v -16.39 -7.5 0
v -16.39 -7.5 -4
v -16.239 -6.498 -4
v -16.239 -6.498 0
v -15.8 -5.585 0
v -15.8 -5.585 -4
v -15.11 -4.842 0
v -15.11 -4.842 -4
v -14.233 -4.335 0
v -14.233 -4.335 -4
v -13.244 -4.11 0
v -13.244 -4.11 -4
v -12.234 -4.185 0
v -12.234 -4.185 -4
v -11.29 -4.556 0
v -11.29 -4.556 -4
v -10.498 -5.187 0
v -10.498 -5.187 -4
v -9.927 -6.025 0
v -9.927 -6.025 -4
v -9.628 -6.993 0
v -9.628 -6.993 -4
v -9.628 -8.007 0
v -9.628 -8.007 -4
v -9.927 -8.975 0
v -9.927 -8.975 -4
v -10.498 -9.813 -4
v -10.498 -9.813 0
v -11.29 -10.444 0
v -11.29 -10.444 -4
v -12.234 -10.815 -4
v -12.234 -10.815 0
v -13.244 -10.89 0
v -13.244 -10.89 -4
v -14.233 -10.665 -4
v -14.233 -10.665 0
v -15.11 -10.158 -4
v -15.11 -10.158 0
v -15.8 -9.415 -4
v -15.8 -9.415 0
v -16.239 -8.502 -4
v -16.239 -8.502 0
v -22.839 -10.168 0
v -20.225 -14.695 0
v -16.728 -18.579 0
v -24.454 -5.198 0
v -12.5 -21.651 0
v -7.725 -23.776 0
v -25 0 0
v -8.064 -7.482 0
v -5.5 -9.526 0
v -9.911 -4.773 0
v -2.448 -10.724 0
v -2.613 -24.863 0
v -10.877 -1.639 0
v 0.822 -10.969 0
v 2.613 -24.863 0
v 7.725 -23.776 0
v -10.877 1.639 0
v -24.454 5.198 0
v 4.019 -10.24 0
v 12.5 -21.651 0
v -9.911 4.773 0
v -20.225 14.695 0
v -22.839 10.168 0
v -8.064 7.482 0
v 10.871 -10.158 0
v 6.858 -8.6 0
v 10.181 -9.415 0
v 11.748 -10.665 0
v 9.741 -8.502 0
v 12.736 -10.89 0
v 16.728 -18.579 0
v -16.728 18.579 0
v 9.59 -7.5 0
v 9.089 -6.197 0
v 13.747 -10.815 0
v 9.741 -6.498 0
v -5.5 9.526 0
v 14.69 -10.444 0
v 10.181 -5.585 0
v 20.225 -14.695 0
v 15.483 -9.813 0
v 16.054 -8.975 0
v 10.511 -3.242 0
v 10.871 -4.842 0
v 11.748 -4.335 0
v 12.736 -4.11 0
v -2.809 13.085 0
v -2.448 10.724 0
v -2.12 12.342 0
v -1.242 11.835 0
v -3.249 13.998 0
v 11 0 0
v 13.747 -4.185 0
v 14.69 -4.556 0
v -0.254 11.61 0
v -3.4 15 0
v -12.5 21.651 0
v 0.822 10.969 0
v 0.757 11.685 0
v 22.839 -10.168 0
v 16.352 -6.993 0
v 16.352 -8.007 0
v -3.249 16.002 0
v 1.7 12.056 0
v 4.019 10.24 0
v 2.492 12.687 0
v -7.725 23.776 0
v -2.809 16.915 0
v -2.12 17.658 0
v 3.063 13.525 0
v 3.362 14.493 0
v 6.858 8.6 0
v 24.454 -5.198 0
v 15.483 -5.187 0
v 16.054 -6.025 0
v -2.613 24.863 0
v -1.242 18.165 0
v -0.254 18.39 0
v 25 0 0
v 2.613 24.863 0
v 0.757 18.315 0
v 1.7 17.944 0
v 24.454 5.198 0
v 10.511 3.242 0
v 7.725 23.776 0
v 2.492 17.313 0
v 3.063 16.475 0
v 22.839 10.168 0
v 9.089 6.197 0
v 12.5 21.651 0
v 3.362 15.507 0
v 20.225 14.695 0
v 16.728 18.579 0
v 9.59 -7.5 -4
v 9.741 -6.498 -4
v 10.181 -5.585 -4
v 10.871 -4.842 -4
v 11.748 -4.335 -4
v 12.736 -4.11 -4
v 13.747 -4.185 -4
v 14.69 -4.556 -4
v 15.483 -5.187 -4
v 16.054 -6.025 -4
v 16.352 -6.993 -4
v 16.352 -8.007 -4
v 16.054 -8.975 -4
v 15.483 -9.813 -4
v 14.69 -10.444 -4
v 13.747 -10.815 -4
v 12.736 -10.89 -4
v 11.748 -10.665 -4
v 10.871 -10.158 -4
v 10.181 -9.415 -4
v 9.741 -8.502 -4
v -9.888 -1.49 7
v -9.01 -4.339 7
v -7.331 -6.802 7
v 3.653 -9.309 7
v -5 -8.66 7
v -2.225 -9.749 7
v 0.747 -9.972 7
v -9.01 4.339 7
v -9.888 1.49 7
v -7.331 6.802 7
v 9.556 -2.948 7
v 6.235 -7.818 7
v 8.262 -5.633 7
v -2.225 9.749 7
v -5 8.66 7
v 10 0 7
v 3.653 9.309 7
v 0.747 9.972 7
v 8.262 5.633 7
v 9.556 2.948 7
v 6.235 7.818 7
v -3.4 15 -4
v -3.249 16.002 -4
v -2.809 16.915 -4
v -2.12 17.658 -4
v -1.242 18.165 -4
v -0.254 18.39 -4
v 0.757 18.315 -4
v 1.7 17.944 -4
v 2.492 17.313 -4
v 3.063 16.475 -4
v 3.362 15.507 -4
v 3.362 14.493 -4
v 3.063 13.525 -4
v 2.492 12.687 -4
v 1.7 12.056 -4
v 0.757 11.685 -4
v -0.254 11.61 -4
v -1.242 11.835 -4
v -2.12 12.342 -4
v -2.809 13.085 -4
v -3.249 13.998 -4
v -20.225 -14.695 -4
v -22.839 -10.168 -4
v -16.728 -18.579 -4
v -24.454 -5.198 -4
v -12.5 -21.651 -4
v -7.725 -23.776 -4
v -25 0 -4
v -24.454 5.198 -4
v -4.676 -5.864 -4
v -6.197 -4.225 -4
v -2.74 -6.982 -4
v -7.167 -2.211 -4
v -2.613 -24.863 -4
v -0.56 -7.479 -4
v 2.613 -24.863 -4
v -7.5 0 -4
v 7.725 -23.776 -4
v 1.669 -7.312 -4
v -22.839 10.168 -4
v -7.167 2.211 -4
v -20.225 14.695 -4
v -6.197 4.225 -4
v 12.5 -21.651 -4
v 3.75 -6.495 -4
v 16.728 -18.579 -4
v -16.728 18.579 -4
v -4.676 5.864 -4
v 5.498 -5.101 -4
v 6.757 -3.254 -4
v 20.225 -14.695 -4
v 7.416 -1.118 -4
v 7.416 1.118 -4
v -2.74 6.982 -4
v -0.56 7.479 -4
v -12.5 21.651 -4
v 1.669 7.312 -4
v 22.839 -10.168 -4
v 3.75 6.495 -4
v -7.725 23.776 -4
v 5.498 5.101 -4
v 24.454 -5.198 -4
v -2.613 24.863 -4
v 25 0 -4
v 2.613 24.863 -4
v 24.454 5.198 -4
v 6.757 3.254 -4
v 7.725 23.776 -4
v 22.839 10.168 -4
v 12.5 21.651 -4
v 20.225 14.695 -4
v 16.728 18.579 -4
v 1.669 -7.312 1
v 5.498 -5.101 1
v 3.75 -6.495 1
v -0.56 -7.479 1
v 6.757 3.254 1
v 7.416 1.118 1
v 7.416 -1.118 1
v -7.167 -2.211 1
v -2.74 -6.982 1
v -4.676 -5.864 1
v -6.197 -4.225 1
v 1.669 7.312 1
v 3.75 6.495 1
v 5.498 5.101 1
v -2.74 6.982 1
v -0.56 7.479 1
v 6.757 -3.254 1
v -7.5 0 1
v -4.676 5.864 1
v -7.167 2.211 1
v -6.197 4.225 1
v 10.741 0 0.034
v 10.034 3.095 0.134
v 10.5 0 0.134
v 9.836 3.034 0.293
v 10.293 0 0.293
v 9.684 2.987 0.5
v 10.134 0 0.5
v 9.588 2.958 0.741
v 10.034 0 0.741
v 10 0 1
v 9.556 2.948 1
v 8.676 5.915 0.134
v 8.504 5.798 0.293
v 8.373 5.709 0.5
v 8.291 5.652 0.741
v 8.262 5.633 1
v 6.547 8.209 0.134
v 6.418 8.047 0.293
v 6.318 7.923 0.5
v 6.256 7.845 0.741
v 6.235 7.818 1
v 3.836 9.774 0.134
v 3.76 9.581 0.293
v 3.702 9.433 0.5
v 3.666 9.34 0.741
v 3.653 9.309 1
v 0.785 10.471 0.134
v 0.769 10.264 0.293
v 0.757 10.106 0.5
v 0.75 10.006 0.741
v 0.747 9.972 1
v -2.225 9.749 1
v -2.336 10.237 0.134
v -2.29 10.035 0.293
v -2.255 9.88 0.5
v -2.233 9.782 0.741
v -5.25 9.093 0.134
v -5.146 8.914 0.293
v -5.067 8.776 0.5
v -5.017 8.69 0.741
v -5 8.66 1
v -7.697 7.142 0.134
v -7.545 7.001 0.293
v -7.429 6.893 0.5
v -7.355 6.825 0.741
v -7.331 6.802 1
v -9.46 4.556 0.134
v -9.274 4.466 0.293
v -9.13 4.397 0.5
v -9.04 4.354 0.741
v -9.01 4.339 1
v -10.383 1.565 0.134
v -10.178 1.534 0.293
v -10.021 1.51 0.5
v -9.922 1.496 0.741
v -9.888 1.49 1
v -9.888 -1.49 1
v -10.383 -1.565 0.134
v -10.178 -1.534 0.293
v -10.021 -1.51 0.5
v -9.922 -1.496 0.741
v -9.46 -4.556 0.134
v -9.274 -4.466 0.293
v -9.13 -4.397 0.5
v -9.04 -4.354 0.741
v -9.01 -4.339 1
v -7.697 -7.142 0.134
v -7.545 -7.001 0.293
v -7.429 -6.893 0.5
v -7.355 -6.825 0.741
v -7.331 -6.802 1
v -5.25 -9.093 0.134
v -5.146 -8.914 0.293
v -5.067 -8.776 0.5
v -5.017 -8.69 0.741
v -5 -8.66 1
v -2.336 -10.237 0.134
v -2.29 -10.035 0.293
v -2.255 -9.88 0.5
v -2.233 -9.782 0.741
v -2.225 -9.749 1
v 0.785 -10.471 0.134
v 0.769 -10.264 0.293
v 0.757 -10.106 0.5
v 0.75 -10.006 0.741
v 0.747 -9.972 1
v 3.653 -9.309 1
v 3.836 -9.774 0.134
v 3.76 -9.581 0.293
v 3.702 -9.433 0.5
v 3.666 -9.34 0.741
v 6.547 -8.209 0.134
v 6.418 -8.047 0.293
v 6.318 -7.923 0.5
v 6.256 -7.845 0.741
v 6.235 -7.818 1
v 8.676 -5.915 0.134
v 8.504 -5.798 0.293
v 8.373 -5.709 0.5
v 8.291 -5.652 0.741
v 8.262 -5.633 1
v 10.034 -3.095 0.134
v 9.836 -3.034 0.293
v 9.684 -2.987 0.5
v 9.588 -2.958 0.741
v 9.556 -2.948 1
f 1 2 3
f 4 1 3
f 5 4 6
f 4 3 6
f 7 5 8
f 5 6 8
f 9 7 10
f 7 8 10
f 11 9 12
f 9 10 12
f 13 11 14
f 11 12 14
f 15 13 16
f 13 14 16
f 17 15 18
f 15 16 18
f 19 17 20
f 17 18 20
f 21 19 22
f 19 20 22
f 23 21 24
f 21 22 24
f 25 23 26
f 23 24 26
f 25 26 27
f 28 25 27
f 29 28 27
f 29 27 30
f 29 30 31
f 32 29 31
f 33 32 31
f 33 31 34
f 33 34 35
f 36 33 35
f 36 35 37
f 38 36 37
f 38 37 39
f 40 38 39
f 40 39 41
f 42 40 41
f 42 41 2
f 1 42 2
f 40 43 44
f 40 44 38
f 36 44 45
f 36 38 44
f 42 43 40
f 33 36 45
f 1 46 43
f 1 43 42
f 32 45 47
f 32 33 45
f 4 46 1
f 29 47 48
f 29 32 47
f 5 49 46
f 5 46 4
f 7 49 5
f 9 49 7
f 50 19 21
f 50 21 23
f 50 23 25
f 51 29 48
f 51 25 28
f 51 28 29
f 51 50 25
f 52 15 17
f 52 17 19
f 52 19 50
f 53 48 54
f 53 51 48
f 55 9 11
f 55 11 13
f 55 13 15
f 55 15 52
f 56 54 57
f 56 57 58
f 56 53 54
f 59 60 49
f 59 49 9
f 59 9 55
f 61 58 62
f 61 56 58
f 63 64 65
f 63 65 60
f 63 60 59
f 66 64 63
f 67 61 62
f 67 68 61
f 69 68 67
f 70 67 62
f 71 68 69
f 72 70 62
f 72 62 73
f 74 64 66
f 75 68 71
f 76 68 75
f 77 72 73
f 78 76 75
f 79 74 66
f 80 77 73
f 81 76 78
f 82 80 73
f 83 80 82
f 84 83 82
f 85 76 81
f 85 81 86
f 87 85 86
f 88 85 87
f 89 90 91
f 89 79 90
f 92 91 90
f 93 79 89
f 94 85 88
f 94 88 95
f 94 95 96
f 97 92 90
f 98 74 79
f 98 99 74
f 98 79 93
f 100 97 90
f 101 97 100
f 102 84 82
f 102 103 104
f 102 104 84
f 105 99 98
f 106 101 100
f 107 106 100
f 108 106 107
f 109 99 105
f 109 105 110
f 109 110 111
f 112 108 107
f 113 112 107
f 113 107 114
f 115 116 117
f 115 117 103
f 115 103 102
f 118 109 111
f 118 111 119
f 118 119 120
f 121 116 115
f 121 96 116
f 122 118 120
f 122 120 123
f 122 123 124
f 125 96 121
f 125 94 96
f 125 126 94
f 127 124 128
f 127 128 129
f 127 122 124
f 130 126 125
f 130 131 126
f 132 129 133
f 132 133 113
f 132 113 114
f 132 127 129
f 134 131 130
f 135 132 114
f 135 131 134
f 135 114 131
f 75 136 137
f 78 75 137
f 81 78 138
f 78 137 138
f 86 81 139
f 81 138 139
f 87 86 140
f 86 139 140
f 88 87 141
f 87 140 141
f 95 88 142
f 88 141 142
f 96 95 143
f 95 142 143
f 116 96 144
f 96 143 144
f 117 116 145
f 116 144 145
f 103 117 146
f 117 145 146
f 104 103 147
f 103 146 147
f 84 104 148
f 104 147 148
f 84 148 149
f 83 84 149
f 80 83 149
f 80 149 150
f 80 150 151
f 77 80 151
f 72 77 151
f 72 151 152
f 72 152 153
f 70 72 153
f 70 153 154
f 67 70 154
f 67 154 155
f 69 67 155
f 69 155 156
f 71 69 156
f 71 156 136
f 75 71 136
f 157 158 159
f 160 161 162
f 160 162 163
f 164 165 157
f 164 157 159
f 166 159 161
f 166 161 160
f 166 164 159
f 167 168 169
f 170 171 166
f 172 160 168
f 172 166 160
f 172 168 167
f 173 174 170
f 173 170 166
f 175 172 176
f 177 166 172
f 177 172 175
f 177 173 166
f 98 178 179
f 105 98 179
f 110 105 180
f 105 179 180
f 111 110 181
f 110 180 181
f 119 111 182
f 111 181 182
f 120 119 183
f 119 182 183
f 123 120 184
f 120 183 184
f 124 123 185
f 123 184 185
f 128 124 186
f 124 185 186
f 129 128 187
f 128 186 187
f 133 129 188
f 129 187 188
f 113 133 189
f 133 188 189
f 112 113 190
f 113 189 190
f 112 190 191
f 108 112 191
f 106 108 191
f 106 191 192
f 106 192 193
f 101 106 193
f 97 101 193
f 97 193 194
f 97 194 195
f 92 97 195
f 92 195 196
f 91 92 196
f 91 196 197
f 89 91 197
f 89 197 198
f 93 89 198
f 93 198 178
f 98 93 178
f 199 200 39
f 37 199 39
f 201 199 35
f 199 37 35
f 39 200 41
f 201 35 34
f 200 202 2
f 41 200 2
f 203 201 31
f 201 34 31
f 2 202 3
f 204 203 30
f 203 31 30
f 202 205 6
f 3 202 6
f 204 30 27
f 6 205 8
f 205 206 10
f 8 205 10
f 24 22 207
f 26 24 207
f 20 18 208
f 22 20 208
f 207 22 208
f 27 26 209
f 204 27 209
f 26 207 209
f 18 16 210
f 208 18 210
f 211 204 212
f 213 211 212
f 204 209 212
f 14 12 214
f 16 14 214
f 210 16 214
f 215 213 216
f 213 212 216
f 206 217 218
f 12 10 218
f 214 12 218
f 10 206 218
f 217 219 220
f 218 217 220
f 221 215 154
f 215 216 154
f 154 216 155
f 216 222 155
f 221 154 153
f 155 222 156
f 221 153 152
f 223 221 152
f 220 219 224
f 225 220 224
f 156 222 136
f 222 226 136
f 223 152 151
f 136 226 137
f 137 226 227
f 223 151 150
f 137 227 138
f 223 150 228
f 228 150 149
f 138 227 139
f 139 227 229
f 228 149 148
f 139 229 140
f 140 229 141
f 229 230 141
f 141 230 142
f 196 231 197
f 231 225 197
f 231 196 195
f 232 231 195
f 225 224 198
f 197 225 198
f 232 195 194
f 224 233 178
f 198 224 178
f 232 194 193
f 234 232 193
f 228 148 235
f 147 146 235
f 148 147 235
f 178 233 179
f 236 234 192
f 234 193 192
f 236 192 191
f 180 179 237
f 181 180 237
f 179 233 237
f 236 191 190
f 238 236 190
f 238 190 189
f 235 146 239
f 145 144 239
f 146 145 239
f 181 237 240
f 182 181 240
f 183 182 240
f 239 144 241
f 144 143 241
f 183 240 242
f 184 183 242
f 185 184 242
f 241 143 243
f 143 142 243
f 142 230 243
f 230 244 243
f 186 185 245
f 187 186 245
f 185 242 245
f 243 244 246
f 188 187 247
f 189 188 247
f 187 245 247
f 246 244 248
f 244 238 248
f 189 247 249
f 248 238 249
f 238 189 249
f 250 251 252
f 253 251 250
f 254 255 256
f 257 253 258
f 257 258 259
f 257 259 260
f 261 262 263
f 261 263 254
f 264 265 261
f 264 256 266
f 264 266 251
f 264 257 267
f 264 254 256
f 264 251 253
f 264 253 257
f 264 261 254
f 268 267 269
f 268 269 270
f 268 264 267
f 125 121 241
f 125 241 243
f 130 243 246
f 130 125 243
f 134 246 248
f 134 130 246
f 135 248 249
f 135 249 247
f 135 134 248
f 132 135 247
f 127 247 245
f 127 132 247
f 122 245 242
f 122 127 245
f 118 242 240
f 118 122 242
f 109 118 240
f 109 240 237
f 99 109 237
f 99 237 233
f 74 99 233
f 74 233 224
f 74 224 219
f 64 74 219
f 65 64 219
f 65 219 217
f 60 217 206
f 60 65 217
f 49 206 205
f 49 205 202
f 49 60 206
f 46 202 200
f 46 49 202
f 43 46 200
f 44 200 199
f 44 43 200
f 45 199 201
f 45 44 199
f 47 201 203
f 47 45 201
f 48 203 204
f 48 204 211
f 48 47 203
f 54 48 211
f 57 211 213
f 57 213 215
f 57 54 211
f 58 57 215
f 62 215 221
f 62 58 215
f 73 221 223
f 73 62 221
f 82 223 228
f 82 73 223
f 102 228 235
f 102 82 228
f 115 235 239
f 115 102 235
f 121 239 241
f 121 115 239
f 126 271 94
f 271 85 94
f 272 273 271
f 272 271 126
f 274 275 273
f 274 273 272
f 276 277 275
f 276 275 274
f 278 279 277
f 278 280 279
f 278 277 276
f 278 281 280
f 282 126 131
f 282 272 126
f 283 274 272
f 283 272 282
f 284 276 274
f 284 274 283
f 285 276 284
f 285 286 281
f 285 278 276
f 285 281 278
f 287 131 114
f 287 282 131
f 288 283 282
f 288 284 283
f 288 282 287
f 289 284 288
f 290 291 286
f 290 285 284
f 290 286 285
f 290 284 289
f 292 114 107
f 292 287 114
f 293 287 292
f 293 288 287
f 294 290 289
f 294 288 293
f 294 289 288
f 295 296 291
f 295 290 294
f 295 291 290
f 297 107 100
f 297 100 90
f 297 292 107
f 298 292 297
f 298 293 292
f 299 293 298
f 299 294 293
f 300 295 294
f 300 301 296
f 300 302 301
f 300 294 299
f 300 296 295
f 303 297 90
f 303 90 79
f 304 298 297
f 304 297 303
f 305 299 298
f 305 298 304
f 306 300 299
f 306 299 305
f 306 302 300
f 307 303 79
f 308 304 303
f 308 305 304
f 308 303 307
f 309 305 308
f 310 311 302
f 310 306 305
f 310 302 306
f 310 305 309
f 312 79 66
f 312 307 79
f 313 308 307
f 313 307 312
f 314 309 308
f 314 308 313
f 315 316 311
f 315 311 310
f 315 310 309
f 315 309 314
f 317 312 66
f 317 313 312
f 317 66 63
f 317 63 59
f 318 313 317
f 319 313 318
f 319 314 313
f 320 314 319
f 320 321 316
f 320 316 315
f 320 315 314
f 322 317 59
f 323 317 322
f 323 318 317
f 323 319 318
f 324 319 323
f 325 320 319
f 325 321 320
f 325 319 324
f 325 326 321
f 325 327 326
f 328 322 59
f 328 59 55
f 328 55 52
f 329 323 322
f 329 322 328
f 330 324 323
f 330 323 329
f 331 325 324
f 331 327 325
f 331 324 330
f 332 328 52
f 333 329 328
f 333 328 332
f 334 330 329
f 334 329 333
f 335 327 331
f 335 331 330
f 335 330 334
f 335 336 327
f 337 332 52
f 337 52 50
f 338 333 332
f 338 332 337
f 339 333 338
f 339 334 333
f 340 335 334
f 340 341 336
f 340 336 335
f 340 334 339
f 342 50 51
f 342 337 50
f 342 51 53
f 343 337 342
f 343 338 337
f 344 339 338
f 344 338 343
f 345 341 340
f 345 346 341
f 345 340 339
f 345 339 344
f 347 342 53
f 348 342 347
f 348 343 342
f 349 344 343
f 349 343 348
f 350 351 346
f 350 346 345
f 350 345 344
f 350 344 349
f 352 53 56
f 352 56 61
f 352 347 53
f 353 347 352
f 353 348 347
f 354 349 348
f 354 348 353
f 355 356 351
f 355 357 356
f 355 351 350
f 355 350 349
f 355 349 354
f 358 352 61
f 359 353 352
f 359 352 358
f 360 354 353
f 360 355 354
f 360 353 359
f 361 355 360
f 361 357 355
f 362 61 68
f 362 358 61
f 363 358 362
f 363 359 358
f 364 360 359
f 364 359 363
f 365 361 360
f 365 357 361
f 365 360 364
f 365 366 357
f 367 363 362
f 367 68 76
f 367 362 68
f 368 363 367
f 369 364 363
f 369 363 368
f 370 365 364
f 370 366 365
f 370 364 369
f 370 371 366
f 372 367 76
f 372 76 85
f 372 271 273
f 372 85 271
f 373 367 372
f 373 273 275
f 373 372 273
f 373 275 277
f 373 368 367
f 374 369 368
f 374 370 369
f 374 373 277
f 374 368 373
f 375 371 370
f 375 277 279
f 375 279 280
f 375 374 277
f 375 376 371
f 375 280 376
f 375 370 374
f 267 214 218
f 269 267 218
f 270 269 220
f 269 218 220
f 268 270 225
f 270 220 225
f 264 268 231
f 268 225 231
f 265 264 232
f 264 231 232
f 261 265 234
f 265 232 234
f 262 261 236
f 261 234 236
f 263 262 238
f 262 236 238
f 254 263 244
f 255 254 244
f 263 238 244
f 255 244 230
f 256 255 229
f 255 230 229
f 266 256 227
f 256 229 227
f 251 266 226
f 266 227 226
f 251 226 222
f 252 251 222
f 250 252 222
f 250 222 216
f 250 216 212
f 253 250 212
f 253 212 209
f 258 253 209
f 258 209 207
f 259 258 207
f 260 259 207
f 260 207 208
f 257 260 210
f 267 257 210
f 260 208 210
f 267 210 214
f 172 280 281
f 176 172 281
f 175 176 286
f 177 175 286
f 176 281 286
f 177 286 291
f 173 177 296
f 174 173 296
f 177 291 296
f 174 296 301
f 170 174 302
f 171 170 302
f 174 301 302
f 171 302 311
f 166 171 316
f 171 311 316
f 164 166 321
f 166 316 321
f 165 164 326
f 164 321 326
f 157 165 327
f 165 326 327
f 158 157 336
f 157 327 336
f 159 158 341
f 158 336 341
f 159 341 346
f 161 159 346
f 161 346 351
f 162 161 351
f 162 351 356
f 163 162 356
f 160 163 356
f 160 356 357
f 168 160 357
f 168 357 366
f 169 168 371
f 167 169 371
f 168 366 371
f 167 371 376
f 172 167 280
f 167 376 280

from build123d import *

# Parameters (mm, degrees)
SKETCH1_R             = 25
BOSS_EXTRUDE1_DEPTH   = 4
SKETCH2_R             = 10
BOSS_EXTRUDE2_DEPTH   = 7
FILLET1_R             = 1
SKETCH3_R             = 7.5
CUT_EXTRUDE1_DEPTH    = 5
F_6_0MM_DOWEL_HOLE1_D = 6.8


with BuildPart() as part:
    # Sketch1 → Boss-Extrude1 (new body)
    with BuildSketch(Plane.XY):
        Circle(SKETCH1_R)
    extrude(amount=-BOSS_EXTRUDE1_DEPTH)

    # Sketch2 → Boss-Extrude2 (add)
    with BuildSketch(Plane.XY):
        Circle(SKETCH2_R)
    extrude(amount=BOSS_EXTRUDE2_DEPTH)

    # Fillet1
    fillet1_edges = [part.edges().sort_by_distance(p)[0] for p in [
        (-10, 0, 0),
    ]]
    fillet(fillet1_edges, radius=FILLET1_R)

    # Sketch3 → Cut-Extrude1 (cut)
    with BuildSketch(Plane(origin=(0, 0, -4), x_dir=(-1, 0, 0), z_dir=(0, 0, -1))):
        Circle(SKETCH3_R)
    extrude(amount=-CUT_EXTRUDE1_DEPTH, mode=Mode.SUBTRACT)

    # Ø6.0mm Dowel Hole1 (through all)
    with Locations(Plane.XY):
        with Locations((-12.990381057, -7.5), (0, 15), (12.990381057, -7.5)):
            Hole(F_6_0MM_DOWEL_HOLE1_D / 2)


solid = part.part
